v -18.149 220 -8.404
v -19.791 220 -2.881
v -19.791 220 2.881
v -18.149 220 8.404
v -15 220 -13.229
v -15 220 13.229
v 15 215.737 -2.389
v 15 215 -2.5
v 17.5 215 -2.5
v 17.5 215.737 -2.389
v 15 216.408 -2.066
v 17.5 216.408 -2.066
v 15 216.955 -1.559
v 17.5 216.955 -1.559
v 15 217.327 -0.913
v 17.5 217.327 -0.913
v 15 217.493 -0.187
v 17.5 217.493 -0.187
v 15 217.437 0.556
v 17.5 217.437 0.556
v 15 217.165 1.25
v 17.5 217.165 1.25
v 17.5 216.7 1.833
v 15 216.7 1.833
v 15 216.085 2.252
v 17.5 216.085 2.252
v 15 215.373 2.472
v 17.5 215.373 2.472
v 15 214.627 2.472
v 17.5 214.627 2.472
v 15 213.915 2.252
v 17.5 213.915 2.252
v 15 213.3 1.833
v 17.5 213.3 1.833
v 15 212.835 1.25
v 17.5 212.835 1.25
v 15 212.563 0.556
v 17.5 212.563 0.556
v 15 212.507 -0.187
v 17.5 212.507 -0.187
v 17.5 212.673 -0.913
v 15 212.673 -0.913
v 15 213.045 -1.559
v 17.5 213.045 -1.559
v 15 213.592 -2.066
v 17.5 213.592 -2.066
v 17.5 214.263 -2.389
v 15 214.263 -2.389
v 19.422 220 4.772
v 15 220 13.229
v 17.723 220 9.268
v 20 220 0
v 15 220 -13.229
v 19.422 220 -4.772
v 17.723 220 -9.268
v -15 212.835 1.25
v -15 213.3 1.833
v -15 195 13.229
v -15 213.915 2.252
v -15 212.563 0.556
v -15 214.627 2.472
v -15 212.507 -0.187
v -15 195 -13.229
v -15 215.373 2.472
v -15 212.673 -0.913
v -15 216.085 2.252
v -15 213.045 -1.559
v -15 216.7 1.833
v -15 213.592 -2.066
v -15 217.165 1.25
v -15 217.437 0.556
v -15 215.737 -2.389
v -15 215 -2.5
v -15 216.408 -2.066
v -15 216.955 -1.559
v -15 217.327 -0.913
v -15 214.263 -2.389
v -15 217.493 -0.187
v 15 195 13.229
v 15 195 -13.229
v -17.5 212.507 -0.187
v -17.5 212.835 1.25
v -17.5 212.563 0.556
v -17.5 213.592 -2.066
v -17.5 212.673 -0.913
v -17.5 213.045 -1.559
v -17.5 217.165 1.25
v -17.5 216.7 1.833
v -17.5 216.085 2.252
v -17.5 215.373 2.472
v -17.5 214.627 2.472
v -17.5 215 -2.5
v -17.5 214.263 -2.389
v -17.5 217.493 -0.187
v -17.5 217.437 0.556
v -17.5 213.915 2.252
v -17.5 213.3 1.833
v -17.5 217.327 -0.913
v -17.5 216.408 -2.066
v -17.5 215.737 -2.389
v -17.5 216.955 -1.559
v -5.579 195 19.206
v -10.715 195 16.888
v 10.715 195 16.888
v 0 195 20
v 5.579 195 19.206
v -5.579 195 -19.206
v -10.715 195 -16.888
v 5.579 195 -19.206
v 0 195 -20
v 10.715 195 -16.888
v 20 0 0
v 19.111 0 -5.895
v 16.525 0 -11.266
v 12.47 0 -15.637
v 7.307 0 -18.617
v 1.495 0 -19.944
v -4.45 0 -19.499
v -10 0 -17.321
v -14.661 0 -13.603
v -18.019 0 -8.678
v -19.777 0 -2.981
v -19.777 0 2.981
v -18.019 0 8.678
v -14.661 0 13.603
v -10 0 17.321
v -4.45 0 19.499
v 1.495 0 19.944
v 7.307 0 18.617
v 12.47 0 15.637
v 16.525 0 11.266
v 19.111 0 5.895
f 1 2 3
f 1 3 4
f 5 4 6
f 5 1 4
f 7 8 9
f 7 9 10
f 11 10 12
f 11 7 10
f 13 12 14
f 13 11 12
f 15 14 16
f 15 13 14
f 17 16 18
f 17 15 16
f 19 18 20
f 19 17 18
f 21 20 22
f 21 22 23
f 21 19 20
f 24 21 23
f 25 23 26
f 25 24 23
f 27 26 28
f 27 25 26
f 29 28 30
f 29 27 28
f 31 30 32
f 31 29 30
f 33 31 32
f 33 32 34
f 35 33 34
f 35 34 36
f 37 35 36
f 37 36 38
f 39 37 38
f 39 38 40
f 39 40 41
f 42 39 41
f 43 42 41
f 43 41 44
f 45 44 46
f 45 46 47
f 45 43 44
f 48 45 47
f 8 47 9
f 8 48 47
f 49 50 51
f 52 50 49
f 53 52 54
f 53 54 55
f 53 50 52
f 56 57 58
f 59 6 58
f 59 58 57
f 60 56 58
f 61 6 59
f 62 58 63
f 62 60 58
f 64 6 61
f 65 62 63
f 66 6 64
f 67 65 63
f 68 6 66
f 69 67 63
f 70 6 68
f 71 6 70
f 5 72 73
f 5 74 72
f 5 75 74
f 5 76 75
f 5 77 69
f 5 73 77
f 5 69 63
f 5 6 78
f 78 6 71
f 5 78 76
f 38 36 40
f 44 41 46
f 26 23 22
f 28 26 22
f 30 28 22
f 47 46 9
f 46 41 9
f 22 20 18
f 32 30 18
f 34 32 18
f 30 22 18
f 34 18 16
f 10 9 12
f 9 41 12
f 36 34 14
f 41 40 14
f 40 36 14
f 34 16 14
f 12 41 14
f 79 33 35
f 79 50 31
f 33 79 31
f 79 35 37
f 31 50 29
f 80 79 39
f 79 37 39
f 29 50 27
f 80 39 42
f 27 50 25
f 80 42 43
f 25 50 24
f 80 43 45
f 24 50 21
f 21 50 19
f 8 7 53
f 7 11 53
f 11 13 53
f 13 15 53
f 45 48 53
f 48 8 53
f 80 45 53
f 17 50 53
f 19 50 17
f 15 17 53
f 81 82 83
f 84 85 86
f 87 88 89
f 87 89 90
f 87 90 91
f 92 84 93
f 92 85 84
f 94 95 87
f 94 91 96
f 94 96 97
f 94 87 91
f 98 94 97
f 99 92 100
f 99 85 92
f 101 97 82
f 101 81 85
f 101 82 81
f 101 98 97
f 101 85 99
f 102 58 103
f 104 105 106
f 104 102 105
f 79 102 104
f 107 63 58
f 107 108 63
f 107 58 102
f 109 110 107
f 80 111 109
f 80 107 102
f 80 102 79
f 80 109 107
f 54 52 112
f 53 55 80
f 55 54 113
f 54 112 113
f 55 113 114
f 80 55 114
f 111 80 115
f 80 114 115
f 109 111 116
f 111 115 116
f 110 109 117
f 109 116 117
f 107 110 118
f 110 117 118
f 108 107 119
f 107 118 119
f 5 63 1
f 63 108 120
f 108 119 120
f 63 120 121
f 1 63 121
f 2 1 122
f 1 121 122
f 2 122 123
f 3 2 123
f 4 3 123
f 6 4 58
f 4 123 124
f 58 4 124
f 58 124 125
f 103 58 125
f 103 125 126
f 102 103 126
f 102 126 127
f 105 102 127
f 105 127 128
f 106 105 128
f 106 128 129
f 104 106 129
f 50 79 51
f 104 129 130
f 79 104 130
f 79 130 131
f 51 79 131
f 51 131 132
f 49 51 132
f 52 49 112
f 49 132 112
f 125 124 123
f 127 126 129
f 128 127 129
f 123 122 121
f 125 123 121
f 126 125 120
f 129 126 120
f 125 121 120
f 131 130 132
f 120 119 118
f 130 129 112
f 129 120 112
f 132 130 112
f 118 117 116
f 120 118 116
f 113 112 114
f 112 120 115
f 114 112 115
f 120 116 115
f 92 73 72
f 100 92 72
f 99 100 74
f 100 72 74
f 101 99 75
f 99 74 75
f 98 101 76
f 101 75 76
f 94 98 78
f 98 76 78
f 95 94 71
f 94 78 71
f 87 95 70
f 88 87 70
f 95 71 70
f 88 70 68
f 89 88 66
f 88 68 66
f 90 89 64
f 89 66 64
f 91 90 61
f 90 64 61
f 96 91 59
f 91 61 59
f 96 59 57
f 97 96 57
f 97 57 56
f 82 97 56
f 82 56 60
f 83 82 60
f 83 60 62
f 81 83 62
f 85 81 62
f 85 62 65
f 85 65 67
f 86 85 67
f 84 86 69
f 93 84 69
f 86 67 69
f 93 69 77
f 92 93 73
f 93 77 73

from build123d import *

# Parameters (mm, degrees)
SKETCH2_R           = 20
BOSS_EXTRUDE1_DEPTH = 220
SKETCH3_W           = 30
SKETCH3_H           = 41.781255482
CUT_EXTRUDE1_DEPTH  = 25
SKETCH4_R           = 2.5
CUT_EXTRUDE2_DEPTH  = 2.5


with BuildPart() as part:
    # Sketch2 → Boss-Extrude1 (new body)
    with BuildSketch(Plane(origin=(0, 0, 0), x_dir=(1, 0, 0), z_dir=(0, 1, 0))):
        Circle(SKETCH2_R)
    extrude(amount=BOSS_EXTRUDE1_DEPTH)

    # Sketch3 → Cut-Extrude1 (cut)
    with BuildSketch(Plane(origin=(0, 220, 0), x_dir=(1, 0, 0), z_dir=(0, 1, 0))):
        Rectangle(SKETCH3_W, SKETCH3_H)
    extrude(amount=-CUT_EXTRUDE1_DEPTH, mode=Mode.SUBTRACT)

    # Sketch4 → Cut-Extrude2 (cut)
    with BuildSketch(Plane(origin=(-15, 0, 0), x_dir=(0, 0, -1), z_dir=(1, 0, 0))):
        with Locations((0, 215)):
            Circle(SKETCH4_R)
    cut_extrude2 = extrude(amount=-CUT_EXTRUDE2_DEPTH, mode=Mode.SUBTRACT)

    # Mirror1: Cut-Extrude2 across plane
    add(cut_extrude2.mirror(Plane(origin=(0, 0, 0), x_dir=(0, 0, 1), z_dir=(1, 0, 0))), mode=Mode.SUBTRACT)


solid = part.part
